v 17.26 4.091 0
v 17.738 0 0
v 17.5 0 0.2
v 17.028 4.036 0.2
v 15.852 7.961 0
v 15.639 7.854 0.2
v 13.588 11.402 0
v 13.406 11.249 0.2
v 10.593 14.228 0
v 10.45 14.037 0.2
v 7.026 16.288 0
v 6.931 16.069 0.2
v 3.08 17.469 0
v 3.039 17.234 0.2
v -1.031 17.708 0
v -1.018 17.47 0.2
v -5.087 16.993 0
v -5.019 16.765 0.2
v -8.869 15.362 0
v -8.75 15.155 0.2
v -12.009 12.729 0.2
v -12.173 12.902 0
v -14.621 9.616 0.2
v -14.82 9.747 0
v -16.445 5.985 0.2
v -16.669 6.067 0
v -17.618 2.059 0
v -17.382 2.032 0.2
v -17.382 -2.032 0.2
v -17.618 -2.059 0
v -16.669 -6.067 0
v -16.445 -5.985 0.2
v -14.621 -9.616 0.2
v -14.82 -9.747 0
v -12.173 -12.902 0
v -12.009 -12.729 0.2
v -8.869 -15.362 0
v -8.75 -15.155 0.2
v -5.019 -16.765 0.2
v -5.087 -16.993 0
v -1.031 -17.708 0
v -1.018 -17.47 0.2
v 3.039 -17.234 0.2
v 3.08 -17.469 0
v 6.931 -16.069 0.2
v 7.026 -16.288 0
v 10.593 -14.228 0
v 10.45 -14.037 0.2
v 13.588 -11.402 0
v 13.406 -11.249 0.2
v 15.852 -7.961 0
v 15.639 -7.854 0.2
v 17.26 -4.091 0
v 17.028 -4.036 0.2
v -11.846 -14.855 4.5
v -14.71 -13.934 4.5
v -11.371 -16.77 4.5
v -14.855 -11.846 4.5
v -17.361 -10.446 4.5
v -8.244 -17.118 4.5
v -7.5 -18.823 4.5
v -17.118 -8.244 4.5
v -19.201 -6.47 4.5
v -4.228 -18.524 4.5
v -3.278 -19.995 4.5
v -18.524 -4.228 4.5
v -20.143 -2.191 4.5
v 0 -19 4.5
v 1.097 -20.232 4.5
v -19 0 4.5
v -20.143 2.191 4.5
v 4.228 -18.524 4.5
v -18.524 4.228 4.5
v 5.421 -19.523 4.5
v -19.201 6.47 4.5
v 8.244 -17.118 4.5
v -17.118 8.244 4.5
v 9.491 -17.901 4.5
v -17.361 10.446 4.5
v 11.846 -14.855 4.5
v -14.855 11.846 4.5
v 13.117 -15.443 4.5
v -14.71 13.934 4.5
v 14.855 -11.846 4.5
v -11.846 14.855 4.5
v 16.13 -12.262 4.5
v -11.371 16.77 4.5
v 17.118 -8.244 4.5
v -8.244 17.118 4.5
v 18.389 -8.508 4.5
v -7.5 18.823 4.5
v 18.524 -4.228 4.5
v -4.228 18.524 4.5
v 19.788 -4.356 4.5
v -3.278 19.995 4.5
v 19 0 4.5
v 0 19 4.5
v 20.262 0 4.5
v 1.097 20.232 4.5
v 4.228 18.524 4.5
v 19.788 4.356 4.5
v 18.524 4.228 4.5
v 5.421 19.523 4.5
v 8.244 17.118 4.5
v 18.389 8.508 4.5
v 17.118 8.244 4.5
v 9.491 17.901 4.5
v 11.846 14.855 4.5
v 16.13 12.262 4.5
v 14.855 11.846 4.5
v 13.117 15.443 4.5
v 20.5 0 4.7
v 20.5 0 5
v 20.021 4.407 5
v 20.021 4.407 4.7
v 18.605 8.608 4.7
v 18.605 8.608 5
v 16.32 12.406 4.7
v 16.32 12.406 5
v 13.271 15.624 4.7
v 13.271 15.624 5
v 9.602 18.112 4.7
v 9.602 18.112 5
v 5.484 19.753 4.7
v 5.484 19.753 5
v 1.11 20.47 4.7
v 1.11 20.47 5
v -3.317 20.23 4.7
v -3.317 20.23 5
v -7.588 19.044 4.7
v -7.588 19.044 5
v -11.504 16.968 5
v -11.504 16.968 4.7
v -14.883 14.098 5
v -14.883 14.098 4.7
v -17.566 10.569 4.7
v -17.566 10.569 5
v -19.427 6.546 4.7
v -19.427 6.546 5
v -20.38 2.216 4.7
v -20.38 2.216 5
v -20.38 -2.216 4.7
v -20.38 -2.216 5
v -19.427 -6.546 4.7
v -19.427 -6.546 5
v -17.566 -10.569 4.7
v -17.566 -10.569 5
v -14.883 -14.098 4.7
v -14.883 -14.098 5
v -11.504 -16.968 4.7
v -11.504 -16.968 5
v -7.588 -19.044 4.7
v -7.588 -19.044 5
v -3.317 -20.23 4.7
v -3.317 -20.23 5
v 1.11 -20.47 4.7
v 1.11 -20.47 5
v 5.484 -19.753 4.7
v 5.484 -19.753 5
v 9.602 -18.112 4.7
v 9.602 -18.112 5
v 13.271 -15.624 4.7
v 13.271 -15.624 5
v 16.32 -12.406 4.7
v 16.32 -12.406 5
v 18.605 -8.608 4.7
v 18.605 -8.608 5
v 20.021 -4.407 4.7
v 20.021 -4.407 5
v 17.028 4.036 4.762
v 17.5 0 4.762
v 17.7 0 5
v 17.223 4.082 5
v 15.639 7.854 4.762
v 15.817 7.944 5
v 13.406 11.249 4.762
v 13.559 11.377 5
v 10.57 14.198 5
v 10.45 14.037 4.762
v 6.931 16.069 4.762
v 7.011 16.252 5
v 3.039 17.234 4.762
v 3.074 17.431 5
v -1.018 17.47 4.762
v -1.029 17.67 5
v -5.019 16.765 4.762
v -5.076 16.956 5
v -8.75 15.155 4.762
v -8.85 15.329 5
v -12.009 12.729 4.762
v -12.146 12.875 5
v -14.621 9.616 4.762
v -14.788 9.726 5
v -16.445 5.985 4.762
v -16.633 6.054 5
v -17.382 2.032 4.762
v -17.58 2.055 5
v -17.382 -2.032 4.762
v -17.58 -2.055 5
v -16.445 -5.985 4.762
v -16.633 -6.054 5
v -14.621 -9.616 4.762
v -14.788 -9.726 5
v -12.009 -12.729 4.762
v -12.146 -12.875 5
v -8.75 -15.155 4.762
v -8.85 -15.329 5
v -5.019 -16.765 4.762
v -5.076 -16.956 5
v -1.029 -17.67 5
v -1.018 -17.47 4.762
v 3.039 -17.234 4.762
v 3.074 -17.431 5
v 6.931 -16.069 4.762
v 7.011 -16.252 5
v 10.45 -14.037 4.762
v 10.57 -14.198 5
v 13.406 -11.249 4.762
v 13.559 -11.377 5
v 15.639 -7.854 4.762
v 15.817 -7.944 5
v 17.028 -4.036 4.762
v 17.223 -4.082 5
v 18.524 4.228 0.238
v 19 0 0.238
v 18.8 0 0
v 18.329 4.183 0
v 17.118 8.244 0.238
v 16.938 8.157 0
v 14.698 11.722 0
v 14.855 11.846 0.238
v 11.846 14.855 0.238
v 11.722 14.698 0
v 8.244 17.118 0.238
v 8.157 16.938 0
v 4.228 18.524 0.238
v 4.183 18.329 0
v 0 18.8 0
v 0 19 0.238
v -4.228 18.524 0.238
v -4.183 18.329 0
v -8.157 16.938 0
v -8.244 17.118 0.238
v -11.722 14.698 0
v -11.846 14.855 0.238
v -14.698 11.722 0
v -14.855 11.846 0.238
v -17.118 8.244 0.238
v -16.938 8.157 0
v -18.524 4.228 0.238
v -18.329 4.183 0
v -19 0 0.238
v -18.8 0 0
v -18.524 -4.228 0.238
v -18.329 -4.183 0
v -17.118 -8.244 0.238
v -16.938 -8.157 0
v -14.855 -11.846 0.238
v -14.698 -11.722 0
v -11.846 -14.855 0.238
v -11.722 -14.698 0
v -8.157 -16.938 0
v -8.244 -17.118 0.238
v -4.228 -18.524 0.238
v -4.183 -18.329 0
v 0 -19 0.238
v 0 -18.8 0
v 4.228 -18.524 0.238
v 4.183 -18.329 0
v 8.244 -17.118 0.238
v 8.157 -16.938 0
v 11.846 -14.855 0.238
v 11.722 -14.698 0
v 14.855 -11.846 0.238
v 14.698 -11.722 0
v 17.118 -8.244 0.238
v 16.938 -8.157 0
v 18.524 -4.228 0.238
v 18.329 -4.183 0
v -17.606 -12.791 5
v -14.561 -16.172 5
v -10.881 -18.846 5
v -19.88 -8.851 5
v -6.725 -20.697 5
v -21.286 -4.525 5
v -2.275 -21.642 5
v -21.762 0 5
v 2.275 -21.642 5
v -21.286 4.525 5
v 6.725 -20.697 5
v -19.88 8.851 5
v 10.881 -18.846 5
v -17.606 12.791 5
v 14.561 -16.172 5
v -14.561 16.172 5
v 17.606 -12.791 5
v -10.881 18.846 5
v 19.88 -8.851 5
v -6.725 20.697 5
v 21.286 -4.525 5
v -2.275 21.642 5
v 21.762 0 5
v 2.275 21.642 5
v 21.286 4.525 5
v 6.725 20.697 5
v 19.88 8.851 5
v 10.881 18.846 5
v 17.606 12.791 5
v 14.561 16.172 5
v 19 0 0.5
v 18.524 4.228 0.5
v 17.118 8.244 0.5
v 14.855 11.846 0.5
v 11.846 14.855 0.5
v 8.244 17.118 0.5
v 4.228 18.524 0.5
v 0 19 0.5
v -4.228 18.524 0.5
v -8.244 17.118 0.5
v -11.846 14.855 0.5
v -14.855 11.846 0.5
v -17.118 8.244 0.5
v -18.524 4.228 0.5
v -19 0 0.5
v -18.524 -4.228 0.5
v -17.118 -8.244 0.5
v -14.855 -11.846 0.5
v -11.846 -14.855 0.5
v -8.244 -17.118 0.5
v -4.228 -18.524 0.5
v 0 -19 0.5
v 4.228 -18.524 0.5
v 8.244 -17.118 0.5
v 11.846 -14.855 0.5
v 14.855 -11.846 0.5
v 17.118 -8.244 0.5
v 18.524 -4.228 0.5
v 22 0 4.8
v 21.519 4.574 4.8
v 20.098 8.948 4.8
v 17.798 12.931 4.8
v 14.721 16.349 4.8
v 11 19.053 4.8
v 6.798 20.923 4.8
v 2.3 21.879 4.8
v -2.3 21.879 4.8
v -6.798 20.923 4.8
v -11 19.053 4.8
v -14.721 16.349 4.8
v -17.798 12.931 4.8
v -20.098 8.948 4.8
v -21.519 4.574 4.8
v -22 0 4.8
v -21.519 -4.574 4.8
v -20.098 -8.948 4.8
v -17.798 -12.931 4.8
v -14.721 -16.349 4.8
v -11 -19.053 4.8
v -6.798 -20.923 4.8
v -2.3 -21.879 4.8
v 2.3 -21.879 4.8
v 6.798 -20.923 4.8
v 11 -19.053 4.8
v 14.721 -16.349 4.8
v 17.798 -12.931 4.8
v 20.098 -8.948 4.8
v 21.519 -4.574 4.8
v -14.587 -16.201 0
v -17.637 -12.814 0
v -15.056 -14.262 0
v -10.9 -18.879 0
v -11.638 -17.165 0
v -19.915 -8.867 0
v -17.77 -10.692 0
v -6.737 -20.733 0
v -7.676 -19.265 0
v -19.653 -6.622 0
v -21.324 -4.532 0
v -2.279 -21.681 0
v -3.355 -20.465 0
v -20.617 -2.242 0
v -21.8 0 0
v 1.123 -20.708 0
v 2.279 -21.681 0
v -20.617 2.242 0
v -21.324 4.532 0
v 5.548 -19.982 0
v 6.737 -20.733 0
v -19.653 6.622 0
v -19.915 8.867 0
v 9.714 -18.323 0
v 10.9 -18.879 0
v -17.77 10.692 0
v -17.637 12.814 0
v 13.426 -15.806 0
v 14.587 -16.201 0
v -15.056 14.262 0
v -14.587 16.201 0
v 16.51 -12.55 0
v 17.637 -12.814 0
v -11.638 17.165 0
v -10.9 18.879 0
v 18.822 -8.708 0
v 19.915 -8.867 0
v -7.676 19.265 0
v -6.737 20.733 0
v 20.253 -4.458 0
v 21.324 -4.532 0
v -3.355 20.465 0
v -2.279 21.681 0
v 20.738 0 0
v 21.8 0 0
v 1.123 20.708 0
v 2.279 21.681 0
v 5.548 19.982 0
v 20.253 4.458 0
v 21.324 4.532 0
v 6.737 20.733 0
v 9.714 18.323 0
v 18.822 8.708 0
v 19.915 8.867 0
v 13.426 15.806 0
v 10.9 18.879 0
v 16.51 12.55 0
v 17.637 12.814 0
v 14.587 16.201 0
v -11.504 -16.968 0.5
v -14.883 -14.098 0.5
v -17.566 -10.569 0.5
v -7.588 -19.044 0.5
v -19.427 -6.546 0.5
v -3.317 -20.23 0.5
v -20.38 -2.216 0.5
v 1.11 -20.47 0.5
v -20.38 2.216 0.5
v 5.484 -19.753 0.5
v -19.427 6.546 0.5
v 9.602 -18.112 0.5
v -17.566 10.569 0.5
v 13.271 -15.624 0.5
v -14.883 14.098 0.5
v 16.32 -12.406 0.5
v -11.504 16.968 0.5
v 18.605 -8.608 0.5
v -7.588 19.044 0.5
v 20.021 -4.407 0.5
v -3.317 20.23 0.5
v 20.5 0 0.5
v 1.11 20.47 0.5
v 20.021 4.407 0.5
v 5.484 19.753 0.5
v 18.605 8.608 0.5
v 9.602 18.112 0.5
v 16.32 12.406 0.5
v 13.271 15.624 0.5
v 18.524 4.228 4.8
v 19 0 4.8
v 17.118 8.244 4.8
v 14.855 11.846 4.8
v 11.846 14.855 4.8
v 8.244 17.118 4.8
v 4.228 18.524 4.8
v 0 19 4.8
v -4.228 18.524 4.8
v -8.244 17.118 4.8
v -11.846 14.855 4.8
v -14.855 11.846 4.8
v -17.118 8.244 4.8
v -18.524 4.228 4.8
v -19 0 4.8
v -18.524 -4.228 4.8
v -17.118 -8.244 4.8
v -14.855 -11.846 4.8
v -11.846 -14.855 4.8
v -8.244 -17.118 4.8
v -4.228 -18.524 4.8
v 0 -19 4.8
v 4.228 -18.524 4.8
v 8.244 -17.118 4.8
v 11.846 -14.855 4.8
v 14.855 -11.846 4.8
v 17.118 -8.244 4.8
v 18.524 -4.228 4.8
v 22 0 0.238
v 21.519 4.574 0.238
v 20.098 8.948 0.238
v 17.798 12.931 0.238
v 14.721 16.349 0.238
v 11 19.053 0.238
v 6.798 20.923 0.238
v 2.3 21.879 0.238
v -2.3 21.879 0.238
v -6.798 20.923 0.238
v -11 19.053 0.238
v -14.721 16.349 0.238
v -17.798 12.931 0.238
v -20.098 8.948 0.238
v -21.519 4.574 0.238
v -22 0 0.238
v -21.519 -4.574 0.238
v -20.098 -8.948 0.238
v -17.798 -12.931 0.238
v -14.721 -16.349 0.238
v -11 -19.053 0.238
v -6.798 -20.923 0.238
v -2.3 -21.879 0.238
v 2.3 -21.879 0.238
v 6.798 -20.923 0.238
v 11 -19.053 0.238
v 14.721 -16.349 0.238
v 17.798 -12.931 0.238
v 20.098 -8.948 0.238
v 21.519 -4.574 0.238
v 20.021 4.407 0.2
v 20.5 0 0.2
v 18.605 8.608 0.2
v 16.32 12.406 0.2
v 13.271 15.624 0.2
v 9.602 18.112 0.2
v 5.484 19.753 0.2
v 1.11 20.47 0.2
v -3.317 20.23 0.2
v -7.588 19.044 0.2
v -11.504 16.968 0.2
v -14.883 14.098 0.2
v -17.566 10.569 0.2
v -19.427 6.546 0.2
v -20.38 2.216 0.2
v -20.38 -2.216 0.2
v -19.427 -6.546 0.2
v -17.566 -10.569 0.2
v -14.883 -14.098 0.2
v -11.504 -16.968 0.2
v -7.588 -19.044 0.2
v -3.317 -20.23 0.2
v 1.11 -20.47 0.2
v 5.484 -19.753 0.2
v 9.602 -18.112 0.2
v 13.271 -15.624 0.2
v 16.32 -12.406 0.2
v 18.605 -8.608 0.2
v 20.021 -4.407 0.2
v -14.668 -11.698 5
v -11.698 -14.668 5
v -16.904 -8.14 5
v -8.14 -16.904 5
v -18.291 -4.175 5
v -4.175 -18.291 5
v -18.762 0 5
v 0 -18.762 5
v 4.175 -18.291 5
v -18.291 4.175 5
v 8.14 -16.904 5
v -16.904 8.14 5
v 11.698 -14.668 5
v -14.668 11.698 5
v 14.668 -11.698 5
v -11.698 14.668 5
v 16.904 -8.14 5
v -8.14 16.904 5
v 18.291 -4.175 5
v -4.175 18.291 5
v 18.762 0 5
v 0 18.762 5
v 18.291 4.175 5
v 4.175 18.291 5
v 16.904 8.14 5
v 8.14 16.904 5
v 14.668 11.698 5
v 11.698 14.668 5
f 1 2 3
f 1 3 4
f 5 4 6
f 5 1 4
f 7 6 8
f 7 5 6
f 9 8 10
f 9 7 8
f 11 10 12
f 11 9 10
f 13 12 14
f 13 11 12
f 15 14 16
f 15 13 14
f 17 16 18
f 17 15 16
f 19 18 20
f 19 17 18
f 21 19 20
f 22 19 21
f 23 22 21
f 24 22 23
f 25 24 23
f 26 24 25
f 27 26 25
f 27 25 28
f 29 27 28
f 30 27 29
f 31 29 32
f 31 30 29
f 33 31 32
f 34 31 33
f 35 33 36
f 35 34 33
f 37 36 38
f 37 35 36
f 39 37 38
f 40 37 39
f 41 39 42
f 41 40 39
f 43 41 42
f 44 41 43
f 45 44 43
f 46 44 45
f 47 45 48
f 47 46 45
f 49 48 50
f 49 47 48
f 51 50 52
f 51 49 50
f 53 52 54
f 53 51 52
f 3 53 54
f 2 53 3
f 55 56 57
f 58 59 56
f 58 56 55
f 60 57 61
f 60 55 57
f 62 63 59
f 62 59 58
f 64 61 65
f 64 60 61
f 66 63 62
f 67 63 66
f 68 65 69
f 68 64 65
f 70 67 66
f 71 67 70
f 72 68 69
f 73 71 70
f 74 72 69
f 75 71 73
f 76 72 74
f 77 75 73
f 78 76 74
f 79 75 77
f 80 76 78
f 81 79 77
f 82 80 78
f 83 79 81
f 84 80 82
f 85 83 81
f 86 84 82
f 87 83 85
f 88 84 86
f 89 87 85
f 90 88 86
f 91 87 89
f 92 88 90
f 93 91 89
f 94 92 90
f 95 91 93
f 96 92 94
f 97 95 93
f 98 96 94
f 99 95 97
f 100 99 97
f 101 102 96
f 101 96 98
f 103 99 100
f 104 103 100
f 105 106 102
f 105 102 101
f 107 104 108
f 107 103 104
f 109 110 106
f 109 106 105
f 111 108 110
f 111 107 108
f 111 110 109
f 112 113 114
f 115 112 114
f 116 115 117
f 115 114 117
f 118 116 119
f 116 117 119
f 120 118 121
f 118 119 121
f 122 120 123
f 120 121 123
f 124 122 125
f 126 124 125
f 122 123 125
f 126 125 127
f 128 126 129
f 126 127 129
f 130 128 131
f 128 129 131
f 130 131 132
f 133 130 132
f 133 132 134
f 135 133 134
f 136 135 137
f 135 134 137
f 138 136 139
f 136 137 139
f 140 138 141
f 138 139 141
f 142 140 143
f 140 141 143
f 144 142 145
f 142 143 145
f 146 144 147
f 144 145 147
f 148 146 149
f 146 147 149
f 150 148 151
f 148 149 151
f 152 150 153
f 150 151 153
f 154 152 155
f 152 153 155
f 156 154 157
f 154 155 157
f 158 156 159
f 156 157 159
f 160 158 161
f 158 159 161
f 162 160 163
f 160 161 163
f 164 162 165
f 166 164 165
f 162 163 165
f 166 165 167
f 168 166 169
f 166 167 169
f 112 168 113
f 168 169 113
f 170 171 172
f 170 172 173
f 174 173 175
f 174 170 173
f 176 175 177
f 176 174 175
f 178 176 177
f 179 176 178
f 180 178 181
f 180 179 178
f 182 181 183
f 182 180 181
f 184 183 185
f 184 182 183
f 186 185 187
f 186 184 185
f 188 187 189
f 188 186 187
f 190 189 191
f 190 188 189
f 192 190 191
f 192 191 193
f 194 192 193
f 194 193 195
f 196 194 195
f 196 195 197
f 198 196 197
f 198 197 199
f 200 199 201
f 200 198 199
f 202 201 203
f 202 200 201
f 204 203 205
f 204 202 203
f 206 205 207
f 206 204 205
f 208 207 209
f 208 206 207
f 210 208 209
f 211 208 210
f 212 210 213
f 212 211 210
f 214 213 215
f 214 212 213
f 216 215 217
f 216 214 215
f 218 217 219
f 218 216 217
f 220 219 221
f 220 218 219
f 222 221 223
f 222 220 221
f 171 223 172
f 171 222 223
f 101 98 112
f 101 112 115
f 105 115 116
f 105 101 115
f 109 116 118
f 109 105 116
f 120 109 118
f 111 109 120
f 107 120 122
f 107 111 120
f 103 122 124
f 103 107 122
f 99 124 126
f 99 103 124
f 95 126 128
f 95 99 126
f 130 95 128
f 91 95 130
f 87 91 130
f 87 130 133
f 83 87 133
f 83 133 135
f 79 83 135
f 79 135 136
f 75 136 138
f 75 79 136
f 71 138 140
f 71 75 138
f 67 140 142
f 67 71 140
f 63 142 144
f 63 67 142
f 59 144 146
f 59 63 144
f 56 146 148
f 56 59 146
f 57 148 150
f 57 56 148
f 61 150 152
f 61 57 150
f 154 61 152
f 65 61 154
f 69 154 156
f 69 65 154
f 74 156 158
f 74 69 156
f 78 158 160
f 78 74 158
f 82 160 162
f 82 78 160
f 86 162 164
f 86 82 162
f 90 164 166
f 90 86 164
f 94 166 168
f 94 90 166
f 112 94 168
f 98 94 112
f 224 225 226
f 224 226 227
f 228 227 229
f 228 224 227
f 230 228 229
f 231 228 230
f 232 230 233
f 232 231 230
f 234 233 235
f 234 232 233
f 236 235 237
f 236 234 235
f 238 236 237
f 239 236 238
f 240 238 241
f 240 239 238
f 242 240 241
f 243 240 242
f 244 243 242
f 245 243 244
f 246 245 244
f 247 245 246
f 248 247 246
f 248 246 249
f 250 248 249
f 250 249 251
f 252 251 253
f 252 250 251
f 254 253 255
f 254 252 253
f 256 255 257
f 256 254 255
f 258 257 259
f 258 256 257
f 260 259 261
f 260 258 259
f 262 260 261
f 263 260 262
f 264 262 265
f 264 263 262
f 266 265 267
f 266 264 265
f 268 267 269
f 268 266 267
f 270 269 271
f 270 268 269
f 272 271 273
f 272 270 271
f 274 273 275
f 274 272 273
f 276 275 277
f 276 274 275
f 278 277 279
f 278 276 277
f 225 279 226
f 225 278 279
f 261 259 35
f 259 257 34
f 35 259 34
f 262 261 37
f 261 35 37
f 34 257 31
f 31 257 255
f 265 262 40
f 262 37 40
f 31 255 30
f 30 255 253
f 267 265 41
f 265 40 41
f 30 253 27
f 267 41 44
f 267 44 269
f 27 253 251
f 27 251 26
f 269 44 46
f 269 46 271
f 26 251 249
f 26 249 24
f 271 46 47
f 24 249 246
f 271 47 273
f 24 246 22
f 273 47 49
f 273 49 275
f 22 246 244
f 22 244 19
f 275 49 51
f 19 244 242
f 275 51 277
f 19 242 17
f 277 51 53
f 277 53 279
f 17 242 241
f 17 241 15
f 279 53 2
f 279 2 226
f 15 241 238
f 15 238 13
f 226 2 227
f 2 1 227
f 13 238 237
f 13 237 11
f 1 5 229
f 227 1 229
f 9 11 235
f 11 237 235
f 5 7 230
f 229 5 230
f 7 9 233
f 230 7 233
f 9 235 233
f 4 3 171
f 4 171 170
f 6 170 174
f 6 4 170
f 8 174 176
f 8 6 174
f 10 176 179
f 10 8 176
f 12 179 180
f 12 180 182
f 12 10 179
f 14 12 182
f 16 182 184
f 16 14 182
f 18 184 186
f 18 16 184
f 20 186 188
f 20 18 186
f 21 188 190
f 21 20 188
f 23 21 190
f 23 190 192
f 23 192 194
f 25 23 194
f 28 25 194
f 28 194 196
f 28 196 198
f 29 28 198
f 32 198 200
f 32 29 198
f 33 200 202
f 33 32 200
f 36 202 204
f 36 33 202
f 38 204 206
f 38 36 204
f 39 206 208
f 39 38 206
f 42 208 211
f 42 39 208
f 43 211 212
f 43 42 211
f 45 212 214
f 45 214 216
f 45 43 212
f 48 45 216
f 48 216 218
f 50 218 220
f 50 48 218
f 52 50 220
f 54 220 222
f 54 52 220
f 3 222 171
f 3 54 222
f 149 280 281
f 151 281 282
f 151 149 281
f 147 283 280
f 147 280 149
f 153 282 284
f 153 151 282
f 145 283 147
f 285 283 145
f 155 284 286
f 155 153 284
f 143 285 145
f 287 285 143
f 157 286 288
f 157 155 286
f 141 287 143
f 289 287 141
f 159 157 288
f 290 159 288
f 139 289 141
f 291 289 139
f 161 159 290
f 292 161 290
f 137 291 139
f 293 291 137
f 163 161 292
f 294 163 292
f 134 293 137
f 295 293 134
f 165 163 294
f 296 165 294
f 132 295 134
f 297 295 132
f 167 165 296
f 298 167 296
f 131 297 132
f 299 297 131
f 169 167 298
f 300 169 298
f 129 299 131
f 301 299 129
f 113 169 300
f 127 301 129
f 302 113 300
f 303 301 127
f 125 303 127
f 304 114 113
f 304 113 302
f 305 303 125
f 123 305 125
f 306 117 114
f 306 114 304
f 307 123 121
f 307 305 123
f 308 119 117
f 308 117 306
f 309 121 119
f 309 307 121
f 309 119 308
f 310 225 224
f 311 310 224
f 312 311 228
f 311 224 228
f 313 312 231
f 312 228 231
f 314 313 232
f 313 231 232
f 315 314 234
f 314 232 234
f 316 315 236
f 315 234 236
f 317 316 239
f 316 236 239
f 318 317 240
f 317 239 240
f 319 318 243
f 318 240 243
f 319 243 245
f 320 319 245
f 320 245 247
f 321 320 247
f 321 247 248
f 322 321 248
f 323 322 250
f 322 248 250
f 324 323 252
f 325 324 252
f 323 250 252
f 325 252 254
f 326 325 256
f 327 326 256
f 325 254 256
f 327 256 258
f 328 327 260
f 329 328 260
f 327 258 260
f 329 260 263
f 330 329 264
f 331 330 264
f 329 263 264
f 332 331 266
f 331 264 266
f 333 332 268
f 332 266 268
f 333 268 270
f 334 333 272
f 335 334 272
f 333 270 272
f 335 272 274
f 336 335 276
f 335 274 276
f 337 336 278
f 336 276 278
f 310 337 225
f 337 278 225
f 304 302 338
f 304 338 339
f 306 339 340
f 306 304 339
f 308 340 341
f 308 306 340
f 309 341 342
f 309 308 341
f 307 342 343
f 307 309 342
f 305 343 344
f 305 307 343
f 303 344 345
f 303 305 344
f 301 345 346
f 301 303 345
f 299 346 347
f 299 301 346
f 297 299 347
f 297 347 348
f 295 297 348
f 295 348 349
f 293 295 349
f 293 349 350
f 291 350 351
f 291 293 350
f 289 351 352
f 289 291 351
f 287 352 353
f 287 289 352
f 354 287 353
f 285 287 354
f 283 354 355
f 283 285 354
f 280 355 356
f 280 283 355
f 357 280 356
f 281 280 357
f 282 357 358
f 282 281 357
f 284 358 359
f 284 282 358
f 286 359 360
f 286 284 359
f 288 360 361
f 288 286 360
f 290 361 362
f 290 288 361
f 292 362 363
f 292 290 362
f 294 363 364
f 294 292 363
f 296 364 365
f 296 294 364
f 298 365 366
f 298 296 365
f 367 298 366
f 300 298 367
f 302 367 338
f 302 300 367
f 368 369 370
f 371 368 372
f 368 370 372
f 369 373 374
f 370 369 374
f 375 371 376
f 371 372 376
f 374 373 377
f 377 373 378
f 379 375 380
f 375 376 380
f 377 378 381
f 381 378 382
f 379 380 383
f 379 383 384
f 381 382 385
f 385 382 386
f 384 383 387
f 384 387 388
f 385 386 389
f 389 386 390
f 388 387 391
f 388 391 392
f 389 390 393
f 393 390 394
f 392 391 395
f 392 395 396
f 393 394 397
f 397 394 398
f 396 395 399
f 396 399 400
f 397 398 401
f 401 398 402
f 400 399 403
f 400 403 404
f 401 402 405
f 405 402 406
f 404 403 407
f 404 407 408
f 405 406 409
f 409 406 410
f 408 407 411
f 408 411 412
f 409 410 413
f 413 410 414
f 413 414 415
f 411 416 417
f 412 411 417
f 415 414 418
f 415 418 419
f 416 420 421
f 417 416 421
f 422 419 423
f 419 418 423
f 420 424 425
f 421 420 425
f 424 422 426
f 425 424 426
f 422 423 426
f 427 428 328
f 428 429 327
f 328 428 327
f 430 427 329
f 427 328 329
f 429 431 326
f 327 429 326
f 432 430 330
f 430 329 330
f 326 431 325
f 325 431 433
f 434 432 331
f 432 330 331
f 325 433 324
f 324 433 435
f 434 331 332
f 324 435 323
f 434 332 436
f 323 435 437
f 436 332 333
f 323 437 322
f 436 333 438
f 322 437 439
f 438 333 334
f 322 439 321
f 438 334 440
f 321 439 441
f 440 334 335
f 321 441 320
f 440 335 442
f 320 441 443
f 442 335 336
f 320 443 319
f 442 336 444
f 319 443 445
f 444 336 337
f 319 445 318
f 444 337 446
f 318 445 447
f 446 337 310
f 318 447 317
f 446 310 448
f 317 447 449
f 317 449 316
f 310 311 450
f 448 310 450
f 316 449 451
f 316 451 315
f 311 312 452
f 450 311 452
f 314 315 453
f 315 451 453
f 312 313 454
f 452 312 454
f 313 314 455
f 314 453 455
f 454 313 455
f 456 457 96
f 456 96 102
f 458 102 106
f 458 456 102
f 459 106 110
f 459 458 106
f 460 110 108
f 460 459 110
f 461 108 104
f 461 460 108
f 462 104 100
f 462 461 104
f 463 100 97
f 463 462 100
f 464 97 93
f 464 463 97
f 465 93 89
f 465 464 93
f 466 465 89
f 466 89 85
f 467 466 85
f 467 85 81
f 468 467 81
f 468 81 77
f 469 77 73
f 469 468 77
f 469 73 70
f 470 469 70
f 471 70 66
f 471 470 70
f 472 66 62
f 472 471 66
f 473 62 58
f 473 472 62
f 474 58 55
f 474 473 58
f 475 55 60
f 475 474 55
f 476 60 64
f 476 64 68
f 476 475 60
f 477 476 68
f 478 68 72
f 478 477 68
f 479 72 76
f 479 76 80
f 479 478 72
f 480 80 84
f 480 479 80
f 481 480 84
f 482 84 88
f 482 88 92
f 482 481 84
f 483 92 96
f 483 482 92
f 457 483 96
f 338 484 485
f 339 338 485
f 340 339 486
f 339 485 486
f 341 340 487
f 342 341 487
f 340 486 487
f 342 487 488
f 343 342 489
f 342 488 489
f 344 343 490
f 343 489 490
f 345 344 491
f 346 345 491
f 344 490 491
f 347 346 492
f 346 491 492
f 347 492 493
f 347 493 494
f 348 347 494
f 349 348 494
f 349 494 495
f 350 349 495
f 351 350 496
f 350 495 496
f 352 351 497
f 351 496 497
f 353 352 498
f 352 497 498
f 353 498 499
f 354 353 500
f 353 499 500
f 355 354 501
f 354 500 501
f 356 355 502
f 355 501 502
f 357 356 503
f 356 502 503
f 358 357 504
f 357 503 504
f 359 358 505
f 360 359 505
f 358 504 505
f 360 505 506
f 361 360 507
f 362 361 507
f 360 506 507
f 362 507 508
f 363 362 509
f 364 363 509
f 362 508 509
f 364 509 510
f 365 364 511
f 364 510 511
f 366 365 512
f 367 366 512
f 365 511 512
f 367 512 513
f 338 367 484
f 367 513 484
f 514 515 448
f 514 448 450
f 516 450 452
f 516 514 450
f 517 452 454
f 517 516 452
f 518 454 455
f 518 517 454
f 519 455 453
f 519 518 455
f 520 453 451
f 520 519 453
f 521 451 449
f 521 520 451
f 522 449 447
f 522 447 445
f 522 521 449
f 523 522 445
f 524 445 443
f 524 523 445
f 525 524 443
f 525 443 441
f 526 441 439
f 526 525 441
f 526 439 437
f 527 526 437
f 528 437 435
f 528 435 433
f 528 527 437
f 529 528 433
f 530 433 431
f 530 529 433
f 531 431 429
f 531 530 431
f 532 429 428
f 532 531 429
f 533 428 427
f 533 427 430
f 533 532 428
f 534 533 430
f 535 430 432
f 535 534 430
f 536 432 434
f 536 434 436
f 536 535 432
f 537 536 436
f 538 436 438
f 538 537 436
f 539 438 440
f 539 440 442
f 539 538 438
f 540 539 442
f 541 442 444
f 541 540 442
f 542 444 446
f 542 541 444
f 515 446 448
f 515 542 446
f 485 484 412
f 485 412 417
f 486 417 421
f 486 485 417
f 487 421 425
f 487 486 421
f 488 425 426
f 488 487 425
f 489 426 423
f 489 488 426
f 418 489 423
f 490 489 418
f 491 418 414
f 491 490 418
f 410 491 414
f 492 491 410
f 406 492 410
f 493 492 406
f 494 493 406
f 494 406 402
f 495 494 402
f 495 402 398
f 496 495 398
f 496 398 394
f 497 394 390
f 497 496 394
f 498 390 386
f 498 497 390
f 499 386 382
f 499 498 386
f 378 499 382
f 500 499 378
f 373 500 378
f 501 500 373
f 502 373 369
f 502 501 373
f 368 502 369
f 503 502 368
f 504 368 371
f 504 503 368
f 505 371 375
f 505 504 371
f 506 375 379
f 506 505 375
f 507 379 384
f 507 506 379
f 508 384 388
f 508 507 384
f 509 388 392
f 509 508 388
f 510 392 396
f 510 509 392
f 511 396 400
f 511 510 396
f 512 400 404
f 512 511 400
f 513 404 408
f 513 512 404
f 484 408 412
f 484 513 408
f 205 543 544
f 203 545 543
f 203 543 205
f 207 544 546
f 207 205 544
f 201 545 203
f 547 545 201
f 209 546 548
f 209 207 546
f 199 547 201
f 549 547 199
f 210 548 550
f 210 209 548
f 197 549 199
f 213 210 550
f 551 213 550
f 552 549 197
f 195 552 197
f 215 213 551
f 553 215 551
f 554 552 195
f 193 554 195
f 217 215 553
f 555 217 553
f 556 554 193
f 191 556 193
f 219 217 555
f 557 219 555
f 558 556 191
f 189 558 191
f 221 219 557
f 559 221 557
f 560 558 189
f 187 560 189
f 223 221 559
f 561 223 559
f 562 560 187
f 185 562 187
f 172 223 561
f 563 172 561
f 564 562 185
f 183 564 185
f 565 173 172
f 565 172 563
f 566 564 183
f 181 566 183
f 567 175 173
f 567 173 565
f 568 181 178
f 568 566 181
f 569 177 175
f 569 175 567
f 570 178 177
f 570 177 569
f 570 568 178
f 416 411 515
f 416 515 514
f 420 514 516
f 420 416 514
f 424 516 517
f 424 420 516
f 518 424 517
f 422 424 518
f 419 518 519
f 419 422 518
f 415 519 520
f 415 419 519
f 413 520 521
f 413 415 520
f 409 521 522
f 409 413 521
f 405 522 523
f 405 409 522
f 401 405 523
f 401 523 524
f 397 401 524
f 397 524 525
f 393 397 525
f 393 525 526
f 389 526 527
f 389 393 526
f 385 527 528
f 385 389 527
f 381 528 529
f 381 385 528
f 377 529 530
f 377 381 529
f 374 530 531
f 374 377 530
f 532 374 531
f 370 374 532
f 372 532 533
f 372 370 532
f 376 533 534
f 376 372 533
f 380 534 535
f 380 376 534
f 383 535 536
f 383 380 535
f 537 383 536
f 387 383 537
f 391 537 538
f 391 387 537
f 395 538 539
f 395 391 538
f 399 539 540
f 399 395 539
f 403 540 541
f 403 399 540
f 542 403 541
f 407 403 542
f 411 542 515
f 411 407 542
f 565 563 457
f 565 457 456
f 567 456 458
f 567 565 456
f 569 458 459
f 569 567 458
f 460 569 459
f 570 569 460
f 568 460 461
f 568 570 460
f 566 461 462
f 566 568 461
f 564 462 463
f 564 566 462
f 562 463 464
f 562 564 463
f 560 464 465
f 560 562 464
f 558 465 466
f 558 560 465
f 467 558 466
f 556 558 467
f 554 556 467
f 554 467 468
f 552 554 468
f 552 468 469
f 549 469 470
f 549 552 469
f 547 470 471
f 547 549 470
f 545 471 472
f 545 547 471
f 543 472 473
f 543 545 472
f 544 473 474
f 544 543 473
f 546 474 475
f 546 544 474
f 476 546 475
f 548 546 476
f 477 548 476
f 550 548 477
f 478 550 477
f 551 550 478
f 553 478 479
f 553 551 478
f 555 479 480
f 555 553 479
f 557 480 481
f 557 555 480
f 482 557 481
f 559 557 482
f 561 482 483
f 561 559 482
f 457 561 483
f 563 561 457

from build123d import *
from OCP.BRepFilletAPI import BRepFilletAPI_MakeChamfer

# Parameters (mm, degrees)
SKETCH_1_R          = 22
SKETCH_1_R_2        = 17.5
EXTRUDE_1_DEPTH     = 5
SKETCH_2_R          = 20.5
SKETCH_2_R_2        = 19
CUT_EXTRUDE_1_DEPTH = 0.5
CHAMFER_1_SIZE      = 0.2
CHAMFER_1_SIZE2     = 0.238350719
CHAMFER_2_SIZE      = 0.2
CHAMFER_2_SIZE2     = 0.238350719


with BuildPart() as part:
    # 草图1 → 凸台-拉伸1 (new body)
    with BuildSketch(Plane.XY):
        Circle(SKETCH_1_R)
        Circle(SKETCH_1_R_2, mode=Mode.SUBTRACT)
    extrude(amount=EXTRUDE_1_DEPTH)

    # 草图2 → 切除-拉伸1 (cut)
    with BuildSketch(Plane.XY.offset(5)):
        Circle(SKETCH_2_R)
        Circle(SKETCH_2_R_2, mode=Mode.SUBTRACT)
    cut_extrude_1 = extrude(amount=-CUT_EXTRUDE_1_DEPTH, mode=Mode.SUBTRACT)

    # 倒角1: one chamfer whose edges measure the first distance from different faces: ONE call of the kernel's chamfer builder (chamfer() names one face for all edges)
    chamfer_1_edges_1 = [part.edges().sort_by_distance(p)[0] for p in [
        (-20.5, 0, 4.5),
    ]]
    chamfer_1_side_1 = [part.faces().sort_by_distance(p)[0] for p in [
        (-20.5, 0, 4.75),
    ]]
    chamfer_1_edges_2 = [part.edges().sort_by_distance(p)[0] for p in [
        (-19, 0, 5),
    ]]
    chamfer_1_side_2 = [part.faces().sort_by_distance(p)[0] for p in [
        (-19, 0, 4.75),
    ]]
    chamfer_1_edges_3 = [part.edges().sort_by_distance(p)[0] for p in [
        (-22, 0, 5),
    ]]
    chamfer_1_side_3 = [part.faces().sort_by_distance(p)[0] for p in [
        (-22, 0, 2.5),
    ]]
    chamfer_1_edges_4 = [part.edges().sort_by_distance(p)[0] for p in [
        (-17.5, 0, 5),
    ]]
    chamfer_1_side_4 = [part.faces().sort_by_distance(p)[0] for p in [
        (-18.462598846, 0, 5),
    ]]
    chamfer_1 = BRepFilletAPI_MakeChamfer(part.part.solid().wrapped)
    for e in chamfer_1_edges_1:
        chamfer_1.Add(CHAMFER_1_SIZE, CHAMFER_1_SIZE2, e.wrapped, chamfer_1_side_1[0].wrapped)  # the first distance lies on this face
    for e in chamfer_1_edges_2:
        chamfer_1.Add(CHAMFER_1_SIZE, CHAMFER_1_SIZE2, e.wrapped, chamfer_1_side_2[0].wrapped)  # the first distance lies on this face
    for e in chamfer_1_edges_3:
        chamfer_1.Add(CHAMFER_1_SIZE, CHAMFER_1_SIZE2, e.wrapped, chamfer_1_side_3[0].wrapped)  # the first distance lies on this face
    for e in chamfer_1_edges_4:
        chamfer_1.Add(CHAMFER_1_SIZE, CHAMFER_1_SIZE2, e.wrapped, chamfer_1_side_4[0].wrapped)  # the first distance lies on this face
    add(Compound.cast(chamfer_1.Shape()), mode=Mode.REPLACE)

    # 镜向1: 切除-拉伸1 across plane
    add(cut_extrude_1.mirror(Plane.XY.offset(2.5)), mode=Mode.SUBTRACT)

    # 倒角2: one chamfer whose edges measure the first distance from different faces: ONE call of the kernel's chamfer builder (chamfer() names one face for all edges)
    chamfer_2_edges_1 = [part.edges().sort_by_distance(p)[0] for p in [
        (-22, 0, 0),
    ]]
    chamfer_2_side_1 = [part.faces().sort_by_distance(p)[0] for p in [
        (-21.377746033, 0, 0),
    ]]
    chamfer_2_edges_2 = [part.edges().sort_by_distance(p)[0] for p in [
        (-19, 0, 0),
    ]]
    chamfer_2_side_2 = [part.faces().sort_by_distance(p)[0] for p in [
        (-18.462598846, 0, 0),
    ]]
    chamfer_2_edges_3 = [part.edges().sort_by_distance(p)[0] for p in [
        (-20.5, 0, 0),
    ]]
    chamfer_2_side_3 = [part.faces().sort_by_distance(p)[0] for p in [
        (-20.5, 0, 0.25),
    ]]
    chamfer_2_edges_4 = [part.edges().sort_by_distance(p)[0] for p in [
        (-17.5, 0, 0),
    ]]
    chamfer_2_side_4 = [part.faces().sort_by_distance(p)[0] for p in [
        (-17.5, 0, 2.380824641),
    ]]
    chamfer_2 = BRepFilletAPI_MakeChamfer(part.part.solid().wrapped)
    for e in chamfer_2_edges_1:
        chamfer_2.Add(CHAMFER_2_SIZE, CHAMFER_2_SIZE2, e.wrapped, chamfer_2_side_1[0].wrapped)  # the first distance lies on this face
    for e in chamfer_2_edges_2:
        chamfer_2.Add(CHAMFER_2_SIZE, CHAMFER_2_SIZE2, e.wrapped, chamfer_2_side_2[0].wrapped)  # the first distance lies on this face
    for e in chamfer_2_edges_3:
        chamfer_2.Add(CHAMFER_2_SIZE, CHAMFER_2_SIZE2, e.wrapped, chamfer_2_side_3[0].wrapped)  # the first distance lies on this face
    for e in chamfer_2_edges_4:
        chamfer_2.Add(CHAMFER_2_SIZE, CHAMFER_2_SIZE2, e.wrapped, chamfer_2_side_4[0].wrapped)  # the first distance lies on this face
    add(Compound.cast(chamfer_2.Shape()), mode=Mode.REPLACE)


solid = part.part
